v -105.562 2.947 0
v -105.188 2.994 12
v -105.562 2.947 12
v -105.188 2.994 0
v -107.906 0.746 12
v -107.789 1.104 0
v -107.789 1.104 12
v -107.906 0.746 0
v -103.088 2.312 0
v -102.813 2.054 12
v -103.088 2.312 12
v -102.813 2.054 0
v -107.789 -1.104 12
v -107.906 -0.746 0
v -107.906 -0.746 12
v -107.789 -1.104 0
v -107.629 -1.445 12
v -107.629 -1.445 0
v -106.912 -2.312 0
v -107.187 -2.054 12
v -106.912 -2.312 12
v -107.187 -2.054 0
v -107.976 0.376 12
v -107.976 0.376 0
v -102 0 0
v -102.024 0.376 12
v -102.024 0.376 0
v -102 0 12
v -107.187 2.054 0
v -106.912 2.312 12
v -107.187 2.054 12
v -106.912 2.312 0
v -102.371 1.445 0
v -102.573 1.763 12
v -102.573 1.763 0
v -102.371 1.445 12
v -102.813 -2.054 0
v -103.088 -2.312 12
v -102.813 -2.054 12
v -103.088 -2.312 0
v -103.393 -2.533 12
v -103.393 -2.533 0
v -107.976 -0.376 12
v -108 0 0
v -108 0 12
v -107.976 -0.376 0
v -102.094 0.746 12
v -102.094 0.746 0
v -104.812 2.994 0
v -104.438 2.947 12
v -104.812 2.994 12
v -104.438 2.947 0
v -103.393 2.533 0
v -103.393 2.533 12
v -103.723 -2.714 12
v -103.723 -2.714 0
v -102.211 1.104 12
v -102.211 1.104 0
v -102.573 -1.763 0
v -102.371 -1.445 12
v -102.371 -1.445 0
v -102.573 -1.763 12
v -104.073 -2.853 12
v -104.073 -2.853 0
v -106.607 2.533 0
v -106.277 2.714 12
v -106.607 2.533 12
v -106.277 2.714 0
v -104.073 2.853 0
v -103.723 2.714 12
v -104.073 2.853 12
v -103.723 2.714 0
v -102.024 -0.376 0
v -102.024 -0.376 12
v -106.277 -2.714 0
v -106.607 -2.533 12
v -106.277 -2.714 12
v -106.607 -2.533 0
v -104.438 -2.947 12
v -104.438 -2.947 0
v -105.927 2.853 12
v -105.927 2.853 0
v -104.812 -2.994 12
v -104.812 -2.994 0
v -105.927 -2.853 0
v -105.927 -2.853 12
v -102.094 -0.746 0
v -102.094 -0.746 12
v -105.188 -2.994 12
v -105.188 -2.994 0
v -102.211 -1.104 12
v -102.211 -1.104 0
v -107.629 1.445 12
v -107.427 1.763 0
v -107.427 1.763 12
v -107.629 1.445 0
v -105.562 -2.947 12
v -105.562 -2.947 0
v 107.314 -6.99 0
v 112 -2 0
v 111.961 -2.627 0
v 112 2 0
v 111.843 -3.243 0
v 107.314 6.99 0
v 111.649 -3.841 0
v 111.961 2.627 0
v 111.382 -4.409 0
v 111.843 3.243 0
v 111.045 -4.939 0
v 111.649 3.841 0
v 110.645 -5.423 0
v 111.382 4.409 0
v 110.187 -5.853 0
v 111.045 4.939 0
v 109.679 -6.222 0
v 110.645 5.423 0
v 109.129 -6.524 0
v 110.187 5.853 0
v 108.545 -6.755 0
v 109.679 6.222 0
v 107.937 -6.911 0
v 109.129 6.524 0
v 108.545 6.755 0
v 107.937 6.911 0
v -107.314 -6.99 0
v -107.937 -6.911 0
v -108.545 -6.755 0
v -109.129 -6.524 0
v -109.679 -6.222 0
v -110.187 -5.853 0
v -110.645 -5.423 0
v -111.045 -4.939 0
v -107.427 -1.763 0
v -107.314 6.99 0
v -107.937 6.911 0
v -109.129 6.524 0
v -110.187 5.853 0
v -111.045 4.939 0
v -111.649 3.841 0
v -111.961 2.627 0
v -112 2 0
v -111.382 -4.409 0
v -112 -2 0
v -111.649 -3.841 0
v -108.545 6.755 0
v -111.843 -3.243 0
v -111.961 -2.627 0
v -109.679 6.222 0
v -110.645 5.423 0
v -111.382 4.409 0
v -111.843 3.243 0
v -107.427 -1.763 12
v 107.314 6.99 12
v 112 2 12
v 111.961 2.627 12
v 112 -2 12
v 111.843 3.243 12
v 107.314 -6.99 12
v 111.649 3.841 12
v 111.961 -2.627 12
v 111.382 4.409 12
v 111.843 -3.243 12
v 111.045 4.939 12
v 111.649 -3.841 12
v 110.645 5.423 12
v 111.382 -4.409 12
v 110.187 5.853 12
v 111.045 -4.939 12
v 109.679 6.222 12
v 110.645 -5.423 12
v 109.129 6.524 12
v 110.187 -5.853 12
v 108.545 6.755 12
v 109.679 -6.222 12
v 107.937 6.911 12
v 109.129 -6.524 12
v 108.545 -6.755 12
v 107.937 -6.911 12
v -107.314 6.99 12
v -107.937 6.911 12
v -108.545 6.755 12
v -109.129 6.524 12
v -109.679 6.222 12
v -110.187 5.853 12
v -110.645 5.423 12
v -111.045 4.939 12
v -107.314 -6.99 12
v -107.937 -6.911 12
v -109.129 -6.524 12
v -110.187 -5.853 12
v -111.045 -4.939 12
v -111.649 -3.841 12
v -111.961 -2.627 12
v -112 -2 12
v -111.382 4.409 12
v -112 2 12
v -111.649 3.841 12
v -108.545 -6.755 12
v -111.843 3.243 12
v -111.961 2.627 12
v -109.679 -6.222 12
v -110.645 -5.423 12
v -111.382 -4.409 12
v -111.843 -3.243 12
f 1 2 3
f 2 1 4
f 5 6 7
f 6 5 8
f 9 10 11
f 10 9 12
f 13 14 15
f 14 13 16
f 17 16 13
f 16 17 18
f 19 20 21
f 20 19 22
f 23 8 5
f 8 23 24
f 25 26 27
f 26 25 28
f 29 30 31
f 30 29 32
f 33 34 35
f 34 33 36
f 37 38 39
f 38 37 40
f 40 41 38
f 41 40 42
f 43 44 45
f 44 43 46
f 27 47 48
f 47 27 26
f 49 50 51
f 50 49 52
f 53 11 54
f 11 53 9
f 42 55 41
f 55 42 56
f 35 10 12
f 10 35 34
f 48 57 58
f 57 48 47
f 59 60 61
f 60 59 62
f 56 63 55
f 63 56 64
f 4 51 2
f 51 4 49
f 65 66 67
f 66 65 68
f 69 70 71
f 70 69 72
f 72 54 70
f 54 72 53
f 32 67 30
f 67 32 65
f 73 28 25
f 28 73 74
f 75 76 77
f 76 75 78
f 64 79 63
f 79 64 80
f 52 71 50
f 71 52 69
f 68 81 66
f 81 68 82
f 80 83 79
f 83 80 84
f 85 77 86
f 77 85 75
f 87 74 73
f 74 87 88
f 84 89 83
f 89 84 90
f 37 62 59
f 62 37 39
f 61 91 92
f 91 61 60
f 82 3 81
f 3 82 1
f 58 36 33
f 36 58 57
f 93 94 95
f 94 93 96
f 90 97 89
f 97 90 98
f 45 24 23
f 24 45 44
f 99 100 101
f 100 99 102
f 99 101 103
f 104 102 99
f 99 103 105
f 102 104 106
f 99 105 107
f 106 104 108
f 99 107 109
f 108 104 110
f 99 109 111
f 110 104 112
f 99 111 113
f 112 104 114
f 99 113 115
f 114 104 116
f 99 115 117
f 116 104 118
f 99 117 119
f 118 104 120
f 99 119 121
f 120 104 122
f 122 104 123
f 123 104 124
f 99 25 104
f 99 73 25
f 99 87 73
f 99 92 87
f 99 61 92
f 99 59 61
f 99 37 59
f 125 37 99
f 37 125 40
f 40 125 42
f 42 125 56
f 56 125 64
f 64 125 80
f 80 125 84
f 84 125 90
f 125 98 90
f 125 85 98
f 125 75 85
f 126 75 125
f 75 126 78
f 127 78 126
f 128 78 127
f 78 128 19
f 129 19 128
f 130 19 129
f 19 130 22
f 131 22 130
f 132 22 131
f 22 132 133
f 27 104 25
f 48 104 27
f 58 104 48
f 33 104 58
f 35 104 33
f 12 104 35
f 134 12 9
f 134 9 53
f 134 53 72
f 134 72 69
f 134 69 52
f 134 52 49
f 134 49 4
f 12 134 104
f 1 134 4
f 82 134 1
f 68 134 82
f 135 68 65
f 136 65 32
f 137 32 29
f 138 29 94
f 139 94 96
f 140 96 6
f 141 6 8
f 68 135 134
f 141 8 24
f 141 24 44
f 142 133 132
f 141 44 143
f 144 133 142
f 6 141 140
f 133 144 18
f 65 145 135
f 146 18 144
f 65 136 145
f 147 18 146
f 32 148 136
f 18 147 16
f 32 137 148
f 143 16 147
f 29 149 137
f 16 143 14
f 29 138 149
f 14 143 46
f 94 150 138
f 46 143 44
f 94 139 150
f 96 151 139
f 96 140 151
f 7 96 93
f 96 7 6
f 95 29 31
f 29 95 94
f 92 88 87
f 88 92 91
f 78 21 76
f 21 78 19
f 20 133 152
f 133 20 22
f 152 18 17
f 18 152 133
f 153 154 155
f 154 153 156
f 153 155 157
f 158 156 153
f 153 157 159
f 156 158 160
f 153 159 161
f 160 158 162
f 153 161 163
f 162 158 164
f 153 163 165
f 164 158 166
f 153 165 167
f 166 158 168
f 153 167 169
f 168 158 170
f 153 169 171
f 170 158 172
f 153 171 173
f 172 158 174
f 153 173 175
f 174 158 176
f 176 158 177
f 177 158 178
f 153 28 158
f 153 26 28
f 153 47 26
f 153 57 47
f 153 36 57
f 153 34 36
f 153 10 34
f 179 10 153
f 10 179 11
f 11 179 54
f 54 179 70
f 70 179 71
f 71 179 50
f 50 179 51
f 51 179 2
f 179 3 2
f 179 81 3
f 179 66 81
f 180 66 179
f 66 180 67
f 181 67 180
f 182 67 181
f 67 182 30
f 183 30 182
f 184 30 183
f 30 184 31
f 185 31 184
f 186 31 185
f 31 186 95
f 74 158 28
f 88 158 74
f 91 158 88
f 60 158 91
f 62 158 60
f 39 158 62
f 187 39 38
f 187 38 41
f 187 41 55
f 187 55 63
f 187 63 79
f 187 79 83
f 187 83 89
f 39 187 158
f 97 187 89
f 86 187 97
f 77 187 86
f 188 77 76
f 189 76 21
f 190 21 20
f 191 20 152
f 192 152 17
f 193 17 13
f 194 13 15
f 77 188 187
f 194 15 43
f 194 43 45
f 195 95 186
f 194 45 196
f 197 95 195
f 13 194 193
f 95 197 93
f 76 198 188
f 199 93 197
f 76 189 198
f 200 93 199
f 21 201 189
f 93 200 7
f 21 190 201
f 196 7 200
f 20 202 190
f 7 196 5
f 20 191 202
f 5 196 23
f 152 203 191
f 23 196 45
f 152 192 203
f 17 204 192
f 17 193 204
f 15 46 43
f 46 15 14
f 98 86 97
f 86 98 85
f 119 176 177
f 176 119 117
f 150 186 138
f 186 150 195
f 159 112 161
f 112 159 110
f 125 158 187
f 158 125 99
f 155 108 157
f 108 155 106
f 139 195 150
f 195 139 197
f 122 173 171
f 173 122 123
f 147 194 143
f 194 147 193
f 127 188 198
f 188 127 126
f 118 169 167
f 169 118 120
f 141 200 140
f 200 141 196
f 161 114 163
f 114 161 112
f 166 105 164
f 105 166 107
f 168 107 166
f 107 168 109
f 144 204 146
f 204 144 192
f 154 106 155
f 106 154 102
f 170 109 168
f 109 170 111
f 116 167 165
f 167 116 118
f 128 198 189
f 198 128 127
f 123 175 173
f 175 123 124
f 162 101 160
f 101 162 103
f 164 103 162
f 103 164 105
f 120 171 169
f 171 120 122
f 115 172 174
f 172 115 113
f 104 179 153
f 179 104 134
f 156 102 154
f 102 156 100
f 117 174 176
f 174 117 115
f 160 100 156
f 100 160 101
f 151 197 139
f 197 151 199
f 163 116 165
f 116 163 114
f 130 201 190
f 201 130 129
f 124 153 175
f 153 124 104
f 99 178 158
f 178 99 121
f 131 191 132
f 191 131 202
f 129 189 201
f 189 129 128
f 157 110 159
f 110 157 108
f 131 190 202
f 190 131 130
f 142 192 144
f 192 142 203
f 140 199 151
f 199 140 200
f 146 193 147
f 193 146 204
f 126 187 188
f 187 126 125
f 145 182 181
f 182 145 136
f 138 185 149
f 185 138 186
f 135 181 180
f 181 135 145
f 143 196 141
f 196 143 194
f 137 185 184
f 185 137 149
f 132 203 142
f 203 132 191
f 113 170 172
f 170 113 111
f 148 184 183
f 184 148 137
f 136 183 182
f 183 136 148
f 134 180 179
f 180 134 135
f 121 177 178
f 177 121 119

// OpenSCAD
$fn = 50;


difference() {
	union() {
		hull() {
			translate(v = [-107.0000000000, 2.0000000000, 0]) {
				cylinder(h = 12, r = 5);
			}
			translate(v = [107.0000000000, 2.0000000000, 0]) {
				cylinder(h = 12, r = 5);
			}
			translate(v = [-107.0000000000, -2.0000000000, 0]) {
				cylinder(h = 12, r = 5);
			}
			translate(v = [107.0000000000, -2.0000000000, 0]) {
				cylinder(h = 12, r = 5);
			}
		}
	}
	union() {
		translate(v = [-105.0000000000, 0.0000000000, 0]) {
			cylinder(h = 12, r = 3.0000000000);
		}
		translate(v = [-105.0000000000, 0.0000000000, 0]) {
			cylinder(h = 12, r = 1.5000000000);
		}
		translate(v = [-105.0000000000, 0.0000000000, 0]) {
			cylinder(h = 12, r = 1.5000000000);
		}
		translate(v = [-105.0000000000, 0.0000000000, 0]) {
			cylinder(h = 12, r = 1.5000000000);
		}
	}
}
